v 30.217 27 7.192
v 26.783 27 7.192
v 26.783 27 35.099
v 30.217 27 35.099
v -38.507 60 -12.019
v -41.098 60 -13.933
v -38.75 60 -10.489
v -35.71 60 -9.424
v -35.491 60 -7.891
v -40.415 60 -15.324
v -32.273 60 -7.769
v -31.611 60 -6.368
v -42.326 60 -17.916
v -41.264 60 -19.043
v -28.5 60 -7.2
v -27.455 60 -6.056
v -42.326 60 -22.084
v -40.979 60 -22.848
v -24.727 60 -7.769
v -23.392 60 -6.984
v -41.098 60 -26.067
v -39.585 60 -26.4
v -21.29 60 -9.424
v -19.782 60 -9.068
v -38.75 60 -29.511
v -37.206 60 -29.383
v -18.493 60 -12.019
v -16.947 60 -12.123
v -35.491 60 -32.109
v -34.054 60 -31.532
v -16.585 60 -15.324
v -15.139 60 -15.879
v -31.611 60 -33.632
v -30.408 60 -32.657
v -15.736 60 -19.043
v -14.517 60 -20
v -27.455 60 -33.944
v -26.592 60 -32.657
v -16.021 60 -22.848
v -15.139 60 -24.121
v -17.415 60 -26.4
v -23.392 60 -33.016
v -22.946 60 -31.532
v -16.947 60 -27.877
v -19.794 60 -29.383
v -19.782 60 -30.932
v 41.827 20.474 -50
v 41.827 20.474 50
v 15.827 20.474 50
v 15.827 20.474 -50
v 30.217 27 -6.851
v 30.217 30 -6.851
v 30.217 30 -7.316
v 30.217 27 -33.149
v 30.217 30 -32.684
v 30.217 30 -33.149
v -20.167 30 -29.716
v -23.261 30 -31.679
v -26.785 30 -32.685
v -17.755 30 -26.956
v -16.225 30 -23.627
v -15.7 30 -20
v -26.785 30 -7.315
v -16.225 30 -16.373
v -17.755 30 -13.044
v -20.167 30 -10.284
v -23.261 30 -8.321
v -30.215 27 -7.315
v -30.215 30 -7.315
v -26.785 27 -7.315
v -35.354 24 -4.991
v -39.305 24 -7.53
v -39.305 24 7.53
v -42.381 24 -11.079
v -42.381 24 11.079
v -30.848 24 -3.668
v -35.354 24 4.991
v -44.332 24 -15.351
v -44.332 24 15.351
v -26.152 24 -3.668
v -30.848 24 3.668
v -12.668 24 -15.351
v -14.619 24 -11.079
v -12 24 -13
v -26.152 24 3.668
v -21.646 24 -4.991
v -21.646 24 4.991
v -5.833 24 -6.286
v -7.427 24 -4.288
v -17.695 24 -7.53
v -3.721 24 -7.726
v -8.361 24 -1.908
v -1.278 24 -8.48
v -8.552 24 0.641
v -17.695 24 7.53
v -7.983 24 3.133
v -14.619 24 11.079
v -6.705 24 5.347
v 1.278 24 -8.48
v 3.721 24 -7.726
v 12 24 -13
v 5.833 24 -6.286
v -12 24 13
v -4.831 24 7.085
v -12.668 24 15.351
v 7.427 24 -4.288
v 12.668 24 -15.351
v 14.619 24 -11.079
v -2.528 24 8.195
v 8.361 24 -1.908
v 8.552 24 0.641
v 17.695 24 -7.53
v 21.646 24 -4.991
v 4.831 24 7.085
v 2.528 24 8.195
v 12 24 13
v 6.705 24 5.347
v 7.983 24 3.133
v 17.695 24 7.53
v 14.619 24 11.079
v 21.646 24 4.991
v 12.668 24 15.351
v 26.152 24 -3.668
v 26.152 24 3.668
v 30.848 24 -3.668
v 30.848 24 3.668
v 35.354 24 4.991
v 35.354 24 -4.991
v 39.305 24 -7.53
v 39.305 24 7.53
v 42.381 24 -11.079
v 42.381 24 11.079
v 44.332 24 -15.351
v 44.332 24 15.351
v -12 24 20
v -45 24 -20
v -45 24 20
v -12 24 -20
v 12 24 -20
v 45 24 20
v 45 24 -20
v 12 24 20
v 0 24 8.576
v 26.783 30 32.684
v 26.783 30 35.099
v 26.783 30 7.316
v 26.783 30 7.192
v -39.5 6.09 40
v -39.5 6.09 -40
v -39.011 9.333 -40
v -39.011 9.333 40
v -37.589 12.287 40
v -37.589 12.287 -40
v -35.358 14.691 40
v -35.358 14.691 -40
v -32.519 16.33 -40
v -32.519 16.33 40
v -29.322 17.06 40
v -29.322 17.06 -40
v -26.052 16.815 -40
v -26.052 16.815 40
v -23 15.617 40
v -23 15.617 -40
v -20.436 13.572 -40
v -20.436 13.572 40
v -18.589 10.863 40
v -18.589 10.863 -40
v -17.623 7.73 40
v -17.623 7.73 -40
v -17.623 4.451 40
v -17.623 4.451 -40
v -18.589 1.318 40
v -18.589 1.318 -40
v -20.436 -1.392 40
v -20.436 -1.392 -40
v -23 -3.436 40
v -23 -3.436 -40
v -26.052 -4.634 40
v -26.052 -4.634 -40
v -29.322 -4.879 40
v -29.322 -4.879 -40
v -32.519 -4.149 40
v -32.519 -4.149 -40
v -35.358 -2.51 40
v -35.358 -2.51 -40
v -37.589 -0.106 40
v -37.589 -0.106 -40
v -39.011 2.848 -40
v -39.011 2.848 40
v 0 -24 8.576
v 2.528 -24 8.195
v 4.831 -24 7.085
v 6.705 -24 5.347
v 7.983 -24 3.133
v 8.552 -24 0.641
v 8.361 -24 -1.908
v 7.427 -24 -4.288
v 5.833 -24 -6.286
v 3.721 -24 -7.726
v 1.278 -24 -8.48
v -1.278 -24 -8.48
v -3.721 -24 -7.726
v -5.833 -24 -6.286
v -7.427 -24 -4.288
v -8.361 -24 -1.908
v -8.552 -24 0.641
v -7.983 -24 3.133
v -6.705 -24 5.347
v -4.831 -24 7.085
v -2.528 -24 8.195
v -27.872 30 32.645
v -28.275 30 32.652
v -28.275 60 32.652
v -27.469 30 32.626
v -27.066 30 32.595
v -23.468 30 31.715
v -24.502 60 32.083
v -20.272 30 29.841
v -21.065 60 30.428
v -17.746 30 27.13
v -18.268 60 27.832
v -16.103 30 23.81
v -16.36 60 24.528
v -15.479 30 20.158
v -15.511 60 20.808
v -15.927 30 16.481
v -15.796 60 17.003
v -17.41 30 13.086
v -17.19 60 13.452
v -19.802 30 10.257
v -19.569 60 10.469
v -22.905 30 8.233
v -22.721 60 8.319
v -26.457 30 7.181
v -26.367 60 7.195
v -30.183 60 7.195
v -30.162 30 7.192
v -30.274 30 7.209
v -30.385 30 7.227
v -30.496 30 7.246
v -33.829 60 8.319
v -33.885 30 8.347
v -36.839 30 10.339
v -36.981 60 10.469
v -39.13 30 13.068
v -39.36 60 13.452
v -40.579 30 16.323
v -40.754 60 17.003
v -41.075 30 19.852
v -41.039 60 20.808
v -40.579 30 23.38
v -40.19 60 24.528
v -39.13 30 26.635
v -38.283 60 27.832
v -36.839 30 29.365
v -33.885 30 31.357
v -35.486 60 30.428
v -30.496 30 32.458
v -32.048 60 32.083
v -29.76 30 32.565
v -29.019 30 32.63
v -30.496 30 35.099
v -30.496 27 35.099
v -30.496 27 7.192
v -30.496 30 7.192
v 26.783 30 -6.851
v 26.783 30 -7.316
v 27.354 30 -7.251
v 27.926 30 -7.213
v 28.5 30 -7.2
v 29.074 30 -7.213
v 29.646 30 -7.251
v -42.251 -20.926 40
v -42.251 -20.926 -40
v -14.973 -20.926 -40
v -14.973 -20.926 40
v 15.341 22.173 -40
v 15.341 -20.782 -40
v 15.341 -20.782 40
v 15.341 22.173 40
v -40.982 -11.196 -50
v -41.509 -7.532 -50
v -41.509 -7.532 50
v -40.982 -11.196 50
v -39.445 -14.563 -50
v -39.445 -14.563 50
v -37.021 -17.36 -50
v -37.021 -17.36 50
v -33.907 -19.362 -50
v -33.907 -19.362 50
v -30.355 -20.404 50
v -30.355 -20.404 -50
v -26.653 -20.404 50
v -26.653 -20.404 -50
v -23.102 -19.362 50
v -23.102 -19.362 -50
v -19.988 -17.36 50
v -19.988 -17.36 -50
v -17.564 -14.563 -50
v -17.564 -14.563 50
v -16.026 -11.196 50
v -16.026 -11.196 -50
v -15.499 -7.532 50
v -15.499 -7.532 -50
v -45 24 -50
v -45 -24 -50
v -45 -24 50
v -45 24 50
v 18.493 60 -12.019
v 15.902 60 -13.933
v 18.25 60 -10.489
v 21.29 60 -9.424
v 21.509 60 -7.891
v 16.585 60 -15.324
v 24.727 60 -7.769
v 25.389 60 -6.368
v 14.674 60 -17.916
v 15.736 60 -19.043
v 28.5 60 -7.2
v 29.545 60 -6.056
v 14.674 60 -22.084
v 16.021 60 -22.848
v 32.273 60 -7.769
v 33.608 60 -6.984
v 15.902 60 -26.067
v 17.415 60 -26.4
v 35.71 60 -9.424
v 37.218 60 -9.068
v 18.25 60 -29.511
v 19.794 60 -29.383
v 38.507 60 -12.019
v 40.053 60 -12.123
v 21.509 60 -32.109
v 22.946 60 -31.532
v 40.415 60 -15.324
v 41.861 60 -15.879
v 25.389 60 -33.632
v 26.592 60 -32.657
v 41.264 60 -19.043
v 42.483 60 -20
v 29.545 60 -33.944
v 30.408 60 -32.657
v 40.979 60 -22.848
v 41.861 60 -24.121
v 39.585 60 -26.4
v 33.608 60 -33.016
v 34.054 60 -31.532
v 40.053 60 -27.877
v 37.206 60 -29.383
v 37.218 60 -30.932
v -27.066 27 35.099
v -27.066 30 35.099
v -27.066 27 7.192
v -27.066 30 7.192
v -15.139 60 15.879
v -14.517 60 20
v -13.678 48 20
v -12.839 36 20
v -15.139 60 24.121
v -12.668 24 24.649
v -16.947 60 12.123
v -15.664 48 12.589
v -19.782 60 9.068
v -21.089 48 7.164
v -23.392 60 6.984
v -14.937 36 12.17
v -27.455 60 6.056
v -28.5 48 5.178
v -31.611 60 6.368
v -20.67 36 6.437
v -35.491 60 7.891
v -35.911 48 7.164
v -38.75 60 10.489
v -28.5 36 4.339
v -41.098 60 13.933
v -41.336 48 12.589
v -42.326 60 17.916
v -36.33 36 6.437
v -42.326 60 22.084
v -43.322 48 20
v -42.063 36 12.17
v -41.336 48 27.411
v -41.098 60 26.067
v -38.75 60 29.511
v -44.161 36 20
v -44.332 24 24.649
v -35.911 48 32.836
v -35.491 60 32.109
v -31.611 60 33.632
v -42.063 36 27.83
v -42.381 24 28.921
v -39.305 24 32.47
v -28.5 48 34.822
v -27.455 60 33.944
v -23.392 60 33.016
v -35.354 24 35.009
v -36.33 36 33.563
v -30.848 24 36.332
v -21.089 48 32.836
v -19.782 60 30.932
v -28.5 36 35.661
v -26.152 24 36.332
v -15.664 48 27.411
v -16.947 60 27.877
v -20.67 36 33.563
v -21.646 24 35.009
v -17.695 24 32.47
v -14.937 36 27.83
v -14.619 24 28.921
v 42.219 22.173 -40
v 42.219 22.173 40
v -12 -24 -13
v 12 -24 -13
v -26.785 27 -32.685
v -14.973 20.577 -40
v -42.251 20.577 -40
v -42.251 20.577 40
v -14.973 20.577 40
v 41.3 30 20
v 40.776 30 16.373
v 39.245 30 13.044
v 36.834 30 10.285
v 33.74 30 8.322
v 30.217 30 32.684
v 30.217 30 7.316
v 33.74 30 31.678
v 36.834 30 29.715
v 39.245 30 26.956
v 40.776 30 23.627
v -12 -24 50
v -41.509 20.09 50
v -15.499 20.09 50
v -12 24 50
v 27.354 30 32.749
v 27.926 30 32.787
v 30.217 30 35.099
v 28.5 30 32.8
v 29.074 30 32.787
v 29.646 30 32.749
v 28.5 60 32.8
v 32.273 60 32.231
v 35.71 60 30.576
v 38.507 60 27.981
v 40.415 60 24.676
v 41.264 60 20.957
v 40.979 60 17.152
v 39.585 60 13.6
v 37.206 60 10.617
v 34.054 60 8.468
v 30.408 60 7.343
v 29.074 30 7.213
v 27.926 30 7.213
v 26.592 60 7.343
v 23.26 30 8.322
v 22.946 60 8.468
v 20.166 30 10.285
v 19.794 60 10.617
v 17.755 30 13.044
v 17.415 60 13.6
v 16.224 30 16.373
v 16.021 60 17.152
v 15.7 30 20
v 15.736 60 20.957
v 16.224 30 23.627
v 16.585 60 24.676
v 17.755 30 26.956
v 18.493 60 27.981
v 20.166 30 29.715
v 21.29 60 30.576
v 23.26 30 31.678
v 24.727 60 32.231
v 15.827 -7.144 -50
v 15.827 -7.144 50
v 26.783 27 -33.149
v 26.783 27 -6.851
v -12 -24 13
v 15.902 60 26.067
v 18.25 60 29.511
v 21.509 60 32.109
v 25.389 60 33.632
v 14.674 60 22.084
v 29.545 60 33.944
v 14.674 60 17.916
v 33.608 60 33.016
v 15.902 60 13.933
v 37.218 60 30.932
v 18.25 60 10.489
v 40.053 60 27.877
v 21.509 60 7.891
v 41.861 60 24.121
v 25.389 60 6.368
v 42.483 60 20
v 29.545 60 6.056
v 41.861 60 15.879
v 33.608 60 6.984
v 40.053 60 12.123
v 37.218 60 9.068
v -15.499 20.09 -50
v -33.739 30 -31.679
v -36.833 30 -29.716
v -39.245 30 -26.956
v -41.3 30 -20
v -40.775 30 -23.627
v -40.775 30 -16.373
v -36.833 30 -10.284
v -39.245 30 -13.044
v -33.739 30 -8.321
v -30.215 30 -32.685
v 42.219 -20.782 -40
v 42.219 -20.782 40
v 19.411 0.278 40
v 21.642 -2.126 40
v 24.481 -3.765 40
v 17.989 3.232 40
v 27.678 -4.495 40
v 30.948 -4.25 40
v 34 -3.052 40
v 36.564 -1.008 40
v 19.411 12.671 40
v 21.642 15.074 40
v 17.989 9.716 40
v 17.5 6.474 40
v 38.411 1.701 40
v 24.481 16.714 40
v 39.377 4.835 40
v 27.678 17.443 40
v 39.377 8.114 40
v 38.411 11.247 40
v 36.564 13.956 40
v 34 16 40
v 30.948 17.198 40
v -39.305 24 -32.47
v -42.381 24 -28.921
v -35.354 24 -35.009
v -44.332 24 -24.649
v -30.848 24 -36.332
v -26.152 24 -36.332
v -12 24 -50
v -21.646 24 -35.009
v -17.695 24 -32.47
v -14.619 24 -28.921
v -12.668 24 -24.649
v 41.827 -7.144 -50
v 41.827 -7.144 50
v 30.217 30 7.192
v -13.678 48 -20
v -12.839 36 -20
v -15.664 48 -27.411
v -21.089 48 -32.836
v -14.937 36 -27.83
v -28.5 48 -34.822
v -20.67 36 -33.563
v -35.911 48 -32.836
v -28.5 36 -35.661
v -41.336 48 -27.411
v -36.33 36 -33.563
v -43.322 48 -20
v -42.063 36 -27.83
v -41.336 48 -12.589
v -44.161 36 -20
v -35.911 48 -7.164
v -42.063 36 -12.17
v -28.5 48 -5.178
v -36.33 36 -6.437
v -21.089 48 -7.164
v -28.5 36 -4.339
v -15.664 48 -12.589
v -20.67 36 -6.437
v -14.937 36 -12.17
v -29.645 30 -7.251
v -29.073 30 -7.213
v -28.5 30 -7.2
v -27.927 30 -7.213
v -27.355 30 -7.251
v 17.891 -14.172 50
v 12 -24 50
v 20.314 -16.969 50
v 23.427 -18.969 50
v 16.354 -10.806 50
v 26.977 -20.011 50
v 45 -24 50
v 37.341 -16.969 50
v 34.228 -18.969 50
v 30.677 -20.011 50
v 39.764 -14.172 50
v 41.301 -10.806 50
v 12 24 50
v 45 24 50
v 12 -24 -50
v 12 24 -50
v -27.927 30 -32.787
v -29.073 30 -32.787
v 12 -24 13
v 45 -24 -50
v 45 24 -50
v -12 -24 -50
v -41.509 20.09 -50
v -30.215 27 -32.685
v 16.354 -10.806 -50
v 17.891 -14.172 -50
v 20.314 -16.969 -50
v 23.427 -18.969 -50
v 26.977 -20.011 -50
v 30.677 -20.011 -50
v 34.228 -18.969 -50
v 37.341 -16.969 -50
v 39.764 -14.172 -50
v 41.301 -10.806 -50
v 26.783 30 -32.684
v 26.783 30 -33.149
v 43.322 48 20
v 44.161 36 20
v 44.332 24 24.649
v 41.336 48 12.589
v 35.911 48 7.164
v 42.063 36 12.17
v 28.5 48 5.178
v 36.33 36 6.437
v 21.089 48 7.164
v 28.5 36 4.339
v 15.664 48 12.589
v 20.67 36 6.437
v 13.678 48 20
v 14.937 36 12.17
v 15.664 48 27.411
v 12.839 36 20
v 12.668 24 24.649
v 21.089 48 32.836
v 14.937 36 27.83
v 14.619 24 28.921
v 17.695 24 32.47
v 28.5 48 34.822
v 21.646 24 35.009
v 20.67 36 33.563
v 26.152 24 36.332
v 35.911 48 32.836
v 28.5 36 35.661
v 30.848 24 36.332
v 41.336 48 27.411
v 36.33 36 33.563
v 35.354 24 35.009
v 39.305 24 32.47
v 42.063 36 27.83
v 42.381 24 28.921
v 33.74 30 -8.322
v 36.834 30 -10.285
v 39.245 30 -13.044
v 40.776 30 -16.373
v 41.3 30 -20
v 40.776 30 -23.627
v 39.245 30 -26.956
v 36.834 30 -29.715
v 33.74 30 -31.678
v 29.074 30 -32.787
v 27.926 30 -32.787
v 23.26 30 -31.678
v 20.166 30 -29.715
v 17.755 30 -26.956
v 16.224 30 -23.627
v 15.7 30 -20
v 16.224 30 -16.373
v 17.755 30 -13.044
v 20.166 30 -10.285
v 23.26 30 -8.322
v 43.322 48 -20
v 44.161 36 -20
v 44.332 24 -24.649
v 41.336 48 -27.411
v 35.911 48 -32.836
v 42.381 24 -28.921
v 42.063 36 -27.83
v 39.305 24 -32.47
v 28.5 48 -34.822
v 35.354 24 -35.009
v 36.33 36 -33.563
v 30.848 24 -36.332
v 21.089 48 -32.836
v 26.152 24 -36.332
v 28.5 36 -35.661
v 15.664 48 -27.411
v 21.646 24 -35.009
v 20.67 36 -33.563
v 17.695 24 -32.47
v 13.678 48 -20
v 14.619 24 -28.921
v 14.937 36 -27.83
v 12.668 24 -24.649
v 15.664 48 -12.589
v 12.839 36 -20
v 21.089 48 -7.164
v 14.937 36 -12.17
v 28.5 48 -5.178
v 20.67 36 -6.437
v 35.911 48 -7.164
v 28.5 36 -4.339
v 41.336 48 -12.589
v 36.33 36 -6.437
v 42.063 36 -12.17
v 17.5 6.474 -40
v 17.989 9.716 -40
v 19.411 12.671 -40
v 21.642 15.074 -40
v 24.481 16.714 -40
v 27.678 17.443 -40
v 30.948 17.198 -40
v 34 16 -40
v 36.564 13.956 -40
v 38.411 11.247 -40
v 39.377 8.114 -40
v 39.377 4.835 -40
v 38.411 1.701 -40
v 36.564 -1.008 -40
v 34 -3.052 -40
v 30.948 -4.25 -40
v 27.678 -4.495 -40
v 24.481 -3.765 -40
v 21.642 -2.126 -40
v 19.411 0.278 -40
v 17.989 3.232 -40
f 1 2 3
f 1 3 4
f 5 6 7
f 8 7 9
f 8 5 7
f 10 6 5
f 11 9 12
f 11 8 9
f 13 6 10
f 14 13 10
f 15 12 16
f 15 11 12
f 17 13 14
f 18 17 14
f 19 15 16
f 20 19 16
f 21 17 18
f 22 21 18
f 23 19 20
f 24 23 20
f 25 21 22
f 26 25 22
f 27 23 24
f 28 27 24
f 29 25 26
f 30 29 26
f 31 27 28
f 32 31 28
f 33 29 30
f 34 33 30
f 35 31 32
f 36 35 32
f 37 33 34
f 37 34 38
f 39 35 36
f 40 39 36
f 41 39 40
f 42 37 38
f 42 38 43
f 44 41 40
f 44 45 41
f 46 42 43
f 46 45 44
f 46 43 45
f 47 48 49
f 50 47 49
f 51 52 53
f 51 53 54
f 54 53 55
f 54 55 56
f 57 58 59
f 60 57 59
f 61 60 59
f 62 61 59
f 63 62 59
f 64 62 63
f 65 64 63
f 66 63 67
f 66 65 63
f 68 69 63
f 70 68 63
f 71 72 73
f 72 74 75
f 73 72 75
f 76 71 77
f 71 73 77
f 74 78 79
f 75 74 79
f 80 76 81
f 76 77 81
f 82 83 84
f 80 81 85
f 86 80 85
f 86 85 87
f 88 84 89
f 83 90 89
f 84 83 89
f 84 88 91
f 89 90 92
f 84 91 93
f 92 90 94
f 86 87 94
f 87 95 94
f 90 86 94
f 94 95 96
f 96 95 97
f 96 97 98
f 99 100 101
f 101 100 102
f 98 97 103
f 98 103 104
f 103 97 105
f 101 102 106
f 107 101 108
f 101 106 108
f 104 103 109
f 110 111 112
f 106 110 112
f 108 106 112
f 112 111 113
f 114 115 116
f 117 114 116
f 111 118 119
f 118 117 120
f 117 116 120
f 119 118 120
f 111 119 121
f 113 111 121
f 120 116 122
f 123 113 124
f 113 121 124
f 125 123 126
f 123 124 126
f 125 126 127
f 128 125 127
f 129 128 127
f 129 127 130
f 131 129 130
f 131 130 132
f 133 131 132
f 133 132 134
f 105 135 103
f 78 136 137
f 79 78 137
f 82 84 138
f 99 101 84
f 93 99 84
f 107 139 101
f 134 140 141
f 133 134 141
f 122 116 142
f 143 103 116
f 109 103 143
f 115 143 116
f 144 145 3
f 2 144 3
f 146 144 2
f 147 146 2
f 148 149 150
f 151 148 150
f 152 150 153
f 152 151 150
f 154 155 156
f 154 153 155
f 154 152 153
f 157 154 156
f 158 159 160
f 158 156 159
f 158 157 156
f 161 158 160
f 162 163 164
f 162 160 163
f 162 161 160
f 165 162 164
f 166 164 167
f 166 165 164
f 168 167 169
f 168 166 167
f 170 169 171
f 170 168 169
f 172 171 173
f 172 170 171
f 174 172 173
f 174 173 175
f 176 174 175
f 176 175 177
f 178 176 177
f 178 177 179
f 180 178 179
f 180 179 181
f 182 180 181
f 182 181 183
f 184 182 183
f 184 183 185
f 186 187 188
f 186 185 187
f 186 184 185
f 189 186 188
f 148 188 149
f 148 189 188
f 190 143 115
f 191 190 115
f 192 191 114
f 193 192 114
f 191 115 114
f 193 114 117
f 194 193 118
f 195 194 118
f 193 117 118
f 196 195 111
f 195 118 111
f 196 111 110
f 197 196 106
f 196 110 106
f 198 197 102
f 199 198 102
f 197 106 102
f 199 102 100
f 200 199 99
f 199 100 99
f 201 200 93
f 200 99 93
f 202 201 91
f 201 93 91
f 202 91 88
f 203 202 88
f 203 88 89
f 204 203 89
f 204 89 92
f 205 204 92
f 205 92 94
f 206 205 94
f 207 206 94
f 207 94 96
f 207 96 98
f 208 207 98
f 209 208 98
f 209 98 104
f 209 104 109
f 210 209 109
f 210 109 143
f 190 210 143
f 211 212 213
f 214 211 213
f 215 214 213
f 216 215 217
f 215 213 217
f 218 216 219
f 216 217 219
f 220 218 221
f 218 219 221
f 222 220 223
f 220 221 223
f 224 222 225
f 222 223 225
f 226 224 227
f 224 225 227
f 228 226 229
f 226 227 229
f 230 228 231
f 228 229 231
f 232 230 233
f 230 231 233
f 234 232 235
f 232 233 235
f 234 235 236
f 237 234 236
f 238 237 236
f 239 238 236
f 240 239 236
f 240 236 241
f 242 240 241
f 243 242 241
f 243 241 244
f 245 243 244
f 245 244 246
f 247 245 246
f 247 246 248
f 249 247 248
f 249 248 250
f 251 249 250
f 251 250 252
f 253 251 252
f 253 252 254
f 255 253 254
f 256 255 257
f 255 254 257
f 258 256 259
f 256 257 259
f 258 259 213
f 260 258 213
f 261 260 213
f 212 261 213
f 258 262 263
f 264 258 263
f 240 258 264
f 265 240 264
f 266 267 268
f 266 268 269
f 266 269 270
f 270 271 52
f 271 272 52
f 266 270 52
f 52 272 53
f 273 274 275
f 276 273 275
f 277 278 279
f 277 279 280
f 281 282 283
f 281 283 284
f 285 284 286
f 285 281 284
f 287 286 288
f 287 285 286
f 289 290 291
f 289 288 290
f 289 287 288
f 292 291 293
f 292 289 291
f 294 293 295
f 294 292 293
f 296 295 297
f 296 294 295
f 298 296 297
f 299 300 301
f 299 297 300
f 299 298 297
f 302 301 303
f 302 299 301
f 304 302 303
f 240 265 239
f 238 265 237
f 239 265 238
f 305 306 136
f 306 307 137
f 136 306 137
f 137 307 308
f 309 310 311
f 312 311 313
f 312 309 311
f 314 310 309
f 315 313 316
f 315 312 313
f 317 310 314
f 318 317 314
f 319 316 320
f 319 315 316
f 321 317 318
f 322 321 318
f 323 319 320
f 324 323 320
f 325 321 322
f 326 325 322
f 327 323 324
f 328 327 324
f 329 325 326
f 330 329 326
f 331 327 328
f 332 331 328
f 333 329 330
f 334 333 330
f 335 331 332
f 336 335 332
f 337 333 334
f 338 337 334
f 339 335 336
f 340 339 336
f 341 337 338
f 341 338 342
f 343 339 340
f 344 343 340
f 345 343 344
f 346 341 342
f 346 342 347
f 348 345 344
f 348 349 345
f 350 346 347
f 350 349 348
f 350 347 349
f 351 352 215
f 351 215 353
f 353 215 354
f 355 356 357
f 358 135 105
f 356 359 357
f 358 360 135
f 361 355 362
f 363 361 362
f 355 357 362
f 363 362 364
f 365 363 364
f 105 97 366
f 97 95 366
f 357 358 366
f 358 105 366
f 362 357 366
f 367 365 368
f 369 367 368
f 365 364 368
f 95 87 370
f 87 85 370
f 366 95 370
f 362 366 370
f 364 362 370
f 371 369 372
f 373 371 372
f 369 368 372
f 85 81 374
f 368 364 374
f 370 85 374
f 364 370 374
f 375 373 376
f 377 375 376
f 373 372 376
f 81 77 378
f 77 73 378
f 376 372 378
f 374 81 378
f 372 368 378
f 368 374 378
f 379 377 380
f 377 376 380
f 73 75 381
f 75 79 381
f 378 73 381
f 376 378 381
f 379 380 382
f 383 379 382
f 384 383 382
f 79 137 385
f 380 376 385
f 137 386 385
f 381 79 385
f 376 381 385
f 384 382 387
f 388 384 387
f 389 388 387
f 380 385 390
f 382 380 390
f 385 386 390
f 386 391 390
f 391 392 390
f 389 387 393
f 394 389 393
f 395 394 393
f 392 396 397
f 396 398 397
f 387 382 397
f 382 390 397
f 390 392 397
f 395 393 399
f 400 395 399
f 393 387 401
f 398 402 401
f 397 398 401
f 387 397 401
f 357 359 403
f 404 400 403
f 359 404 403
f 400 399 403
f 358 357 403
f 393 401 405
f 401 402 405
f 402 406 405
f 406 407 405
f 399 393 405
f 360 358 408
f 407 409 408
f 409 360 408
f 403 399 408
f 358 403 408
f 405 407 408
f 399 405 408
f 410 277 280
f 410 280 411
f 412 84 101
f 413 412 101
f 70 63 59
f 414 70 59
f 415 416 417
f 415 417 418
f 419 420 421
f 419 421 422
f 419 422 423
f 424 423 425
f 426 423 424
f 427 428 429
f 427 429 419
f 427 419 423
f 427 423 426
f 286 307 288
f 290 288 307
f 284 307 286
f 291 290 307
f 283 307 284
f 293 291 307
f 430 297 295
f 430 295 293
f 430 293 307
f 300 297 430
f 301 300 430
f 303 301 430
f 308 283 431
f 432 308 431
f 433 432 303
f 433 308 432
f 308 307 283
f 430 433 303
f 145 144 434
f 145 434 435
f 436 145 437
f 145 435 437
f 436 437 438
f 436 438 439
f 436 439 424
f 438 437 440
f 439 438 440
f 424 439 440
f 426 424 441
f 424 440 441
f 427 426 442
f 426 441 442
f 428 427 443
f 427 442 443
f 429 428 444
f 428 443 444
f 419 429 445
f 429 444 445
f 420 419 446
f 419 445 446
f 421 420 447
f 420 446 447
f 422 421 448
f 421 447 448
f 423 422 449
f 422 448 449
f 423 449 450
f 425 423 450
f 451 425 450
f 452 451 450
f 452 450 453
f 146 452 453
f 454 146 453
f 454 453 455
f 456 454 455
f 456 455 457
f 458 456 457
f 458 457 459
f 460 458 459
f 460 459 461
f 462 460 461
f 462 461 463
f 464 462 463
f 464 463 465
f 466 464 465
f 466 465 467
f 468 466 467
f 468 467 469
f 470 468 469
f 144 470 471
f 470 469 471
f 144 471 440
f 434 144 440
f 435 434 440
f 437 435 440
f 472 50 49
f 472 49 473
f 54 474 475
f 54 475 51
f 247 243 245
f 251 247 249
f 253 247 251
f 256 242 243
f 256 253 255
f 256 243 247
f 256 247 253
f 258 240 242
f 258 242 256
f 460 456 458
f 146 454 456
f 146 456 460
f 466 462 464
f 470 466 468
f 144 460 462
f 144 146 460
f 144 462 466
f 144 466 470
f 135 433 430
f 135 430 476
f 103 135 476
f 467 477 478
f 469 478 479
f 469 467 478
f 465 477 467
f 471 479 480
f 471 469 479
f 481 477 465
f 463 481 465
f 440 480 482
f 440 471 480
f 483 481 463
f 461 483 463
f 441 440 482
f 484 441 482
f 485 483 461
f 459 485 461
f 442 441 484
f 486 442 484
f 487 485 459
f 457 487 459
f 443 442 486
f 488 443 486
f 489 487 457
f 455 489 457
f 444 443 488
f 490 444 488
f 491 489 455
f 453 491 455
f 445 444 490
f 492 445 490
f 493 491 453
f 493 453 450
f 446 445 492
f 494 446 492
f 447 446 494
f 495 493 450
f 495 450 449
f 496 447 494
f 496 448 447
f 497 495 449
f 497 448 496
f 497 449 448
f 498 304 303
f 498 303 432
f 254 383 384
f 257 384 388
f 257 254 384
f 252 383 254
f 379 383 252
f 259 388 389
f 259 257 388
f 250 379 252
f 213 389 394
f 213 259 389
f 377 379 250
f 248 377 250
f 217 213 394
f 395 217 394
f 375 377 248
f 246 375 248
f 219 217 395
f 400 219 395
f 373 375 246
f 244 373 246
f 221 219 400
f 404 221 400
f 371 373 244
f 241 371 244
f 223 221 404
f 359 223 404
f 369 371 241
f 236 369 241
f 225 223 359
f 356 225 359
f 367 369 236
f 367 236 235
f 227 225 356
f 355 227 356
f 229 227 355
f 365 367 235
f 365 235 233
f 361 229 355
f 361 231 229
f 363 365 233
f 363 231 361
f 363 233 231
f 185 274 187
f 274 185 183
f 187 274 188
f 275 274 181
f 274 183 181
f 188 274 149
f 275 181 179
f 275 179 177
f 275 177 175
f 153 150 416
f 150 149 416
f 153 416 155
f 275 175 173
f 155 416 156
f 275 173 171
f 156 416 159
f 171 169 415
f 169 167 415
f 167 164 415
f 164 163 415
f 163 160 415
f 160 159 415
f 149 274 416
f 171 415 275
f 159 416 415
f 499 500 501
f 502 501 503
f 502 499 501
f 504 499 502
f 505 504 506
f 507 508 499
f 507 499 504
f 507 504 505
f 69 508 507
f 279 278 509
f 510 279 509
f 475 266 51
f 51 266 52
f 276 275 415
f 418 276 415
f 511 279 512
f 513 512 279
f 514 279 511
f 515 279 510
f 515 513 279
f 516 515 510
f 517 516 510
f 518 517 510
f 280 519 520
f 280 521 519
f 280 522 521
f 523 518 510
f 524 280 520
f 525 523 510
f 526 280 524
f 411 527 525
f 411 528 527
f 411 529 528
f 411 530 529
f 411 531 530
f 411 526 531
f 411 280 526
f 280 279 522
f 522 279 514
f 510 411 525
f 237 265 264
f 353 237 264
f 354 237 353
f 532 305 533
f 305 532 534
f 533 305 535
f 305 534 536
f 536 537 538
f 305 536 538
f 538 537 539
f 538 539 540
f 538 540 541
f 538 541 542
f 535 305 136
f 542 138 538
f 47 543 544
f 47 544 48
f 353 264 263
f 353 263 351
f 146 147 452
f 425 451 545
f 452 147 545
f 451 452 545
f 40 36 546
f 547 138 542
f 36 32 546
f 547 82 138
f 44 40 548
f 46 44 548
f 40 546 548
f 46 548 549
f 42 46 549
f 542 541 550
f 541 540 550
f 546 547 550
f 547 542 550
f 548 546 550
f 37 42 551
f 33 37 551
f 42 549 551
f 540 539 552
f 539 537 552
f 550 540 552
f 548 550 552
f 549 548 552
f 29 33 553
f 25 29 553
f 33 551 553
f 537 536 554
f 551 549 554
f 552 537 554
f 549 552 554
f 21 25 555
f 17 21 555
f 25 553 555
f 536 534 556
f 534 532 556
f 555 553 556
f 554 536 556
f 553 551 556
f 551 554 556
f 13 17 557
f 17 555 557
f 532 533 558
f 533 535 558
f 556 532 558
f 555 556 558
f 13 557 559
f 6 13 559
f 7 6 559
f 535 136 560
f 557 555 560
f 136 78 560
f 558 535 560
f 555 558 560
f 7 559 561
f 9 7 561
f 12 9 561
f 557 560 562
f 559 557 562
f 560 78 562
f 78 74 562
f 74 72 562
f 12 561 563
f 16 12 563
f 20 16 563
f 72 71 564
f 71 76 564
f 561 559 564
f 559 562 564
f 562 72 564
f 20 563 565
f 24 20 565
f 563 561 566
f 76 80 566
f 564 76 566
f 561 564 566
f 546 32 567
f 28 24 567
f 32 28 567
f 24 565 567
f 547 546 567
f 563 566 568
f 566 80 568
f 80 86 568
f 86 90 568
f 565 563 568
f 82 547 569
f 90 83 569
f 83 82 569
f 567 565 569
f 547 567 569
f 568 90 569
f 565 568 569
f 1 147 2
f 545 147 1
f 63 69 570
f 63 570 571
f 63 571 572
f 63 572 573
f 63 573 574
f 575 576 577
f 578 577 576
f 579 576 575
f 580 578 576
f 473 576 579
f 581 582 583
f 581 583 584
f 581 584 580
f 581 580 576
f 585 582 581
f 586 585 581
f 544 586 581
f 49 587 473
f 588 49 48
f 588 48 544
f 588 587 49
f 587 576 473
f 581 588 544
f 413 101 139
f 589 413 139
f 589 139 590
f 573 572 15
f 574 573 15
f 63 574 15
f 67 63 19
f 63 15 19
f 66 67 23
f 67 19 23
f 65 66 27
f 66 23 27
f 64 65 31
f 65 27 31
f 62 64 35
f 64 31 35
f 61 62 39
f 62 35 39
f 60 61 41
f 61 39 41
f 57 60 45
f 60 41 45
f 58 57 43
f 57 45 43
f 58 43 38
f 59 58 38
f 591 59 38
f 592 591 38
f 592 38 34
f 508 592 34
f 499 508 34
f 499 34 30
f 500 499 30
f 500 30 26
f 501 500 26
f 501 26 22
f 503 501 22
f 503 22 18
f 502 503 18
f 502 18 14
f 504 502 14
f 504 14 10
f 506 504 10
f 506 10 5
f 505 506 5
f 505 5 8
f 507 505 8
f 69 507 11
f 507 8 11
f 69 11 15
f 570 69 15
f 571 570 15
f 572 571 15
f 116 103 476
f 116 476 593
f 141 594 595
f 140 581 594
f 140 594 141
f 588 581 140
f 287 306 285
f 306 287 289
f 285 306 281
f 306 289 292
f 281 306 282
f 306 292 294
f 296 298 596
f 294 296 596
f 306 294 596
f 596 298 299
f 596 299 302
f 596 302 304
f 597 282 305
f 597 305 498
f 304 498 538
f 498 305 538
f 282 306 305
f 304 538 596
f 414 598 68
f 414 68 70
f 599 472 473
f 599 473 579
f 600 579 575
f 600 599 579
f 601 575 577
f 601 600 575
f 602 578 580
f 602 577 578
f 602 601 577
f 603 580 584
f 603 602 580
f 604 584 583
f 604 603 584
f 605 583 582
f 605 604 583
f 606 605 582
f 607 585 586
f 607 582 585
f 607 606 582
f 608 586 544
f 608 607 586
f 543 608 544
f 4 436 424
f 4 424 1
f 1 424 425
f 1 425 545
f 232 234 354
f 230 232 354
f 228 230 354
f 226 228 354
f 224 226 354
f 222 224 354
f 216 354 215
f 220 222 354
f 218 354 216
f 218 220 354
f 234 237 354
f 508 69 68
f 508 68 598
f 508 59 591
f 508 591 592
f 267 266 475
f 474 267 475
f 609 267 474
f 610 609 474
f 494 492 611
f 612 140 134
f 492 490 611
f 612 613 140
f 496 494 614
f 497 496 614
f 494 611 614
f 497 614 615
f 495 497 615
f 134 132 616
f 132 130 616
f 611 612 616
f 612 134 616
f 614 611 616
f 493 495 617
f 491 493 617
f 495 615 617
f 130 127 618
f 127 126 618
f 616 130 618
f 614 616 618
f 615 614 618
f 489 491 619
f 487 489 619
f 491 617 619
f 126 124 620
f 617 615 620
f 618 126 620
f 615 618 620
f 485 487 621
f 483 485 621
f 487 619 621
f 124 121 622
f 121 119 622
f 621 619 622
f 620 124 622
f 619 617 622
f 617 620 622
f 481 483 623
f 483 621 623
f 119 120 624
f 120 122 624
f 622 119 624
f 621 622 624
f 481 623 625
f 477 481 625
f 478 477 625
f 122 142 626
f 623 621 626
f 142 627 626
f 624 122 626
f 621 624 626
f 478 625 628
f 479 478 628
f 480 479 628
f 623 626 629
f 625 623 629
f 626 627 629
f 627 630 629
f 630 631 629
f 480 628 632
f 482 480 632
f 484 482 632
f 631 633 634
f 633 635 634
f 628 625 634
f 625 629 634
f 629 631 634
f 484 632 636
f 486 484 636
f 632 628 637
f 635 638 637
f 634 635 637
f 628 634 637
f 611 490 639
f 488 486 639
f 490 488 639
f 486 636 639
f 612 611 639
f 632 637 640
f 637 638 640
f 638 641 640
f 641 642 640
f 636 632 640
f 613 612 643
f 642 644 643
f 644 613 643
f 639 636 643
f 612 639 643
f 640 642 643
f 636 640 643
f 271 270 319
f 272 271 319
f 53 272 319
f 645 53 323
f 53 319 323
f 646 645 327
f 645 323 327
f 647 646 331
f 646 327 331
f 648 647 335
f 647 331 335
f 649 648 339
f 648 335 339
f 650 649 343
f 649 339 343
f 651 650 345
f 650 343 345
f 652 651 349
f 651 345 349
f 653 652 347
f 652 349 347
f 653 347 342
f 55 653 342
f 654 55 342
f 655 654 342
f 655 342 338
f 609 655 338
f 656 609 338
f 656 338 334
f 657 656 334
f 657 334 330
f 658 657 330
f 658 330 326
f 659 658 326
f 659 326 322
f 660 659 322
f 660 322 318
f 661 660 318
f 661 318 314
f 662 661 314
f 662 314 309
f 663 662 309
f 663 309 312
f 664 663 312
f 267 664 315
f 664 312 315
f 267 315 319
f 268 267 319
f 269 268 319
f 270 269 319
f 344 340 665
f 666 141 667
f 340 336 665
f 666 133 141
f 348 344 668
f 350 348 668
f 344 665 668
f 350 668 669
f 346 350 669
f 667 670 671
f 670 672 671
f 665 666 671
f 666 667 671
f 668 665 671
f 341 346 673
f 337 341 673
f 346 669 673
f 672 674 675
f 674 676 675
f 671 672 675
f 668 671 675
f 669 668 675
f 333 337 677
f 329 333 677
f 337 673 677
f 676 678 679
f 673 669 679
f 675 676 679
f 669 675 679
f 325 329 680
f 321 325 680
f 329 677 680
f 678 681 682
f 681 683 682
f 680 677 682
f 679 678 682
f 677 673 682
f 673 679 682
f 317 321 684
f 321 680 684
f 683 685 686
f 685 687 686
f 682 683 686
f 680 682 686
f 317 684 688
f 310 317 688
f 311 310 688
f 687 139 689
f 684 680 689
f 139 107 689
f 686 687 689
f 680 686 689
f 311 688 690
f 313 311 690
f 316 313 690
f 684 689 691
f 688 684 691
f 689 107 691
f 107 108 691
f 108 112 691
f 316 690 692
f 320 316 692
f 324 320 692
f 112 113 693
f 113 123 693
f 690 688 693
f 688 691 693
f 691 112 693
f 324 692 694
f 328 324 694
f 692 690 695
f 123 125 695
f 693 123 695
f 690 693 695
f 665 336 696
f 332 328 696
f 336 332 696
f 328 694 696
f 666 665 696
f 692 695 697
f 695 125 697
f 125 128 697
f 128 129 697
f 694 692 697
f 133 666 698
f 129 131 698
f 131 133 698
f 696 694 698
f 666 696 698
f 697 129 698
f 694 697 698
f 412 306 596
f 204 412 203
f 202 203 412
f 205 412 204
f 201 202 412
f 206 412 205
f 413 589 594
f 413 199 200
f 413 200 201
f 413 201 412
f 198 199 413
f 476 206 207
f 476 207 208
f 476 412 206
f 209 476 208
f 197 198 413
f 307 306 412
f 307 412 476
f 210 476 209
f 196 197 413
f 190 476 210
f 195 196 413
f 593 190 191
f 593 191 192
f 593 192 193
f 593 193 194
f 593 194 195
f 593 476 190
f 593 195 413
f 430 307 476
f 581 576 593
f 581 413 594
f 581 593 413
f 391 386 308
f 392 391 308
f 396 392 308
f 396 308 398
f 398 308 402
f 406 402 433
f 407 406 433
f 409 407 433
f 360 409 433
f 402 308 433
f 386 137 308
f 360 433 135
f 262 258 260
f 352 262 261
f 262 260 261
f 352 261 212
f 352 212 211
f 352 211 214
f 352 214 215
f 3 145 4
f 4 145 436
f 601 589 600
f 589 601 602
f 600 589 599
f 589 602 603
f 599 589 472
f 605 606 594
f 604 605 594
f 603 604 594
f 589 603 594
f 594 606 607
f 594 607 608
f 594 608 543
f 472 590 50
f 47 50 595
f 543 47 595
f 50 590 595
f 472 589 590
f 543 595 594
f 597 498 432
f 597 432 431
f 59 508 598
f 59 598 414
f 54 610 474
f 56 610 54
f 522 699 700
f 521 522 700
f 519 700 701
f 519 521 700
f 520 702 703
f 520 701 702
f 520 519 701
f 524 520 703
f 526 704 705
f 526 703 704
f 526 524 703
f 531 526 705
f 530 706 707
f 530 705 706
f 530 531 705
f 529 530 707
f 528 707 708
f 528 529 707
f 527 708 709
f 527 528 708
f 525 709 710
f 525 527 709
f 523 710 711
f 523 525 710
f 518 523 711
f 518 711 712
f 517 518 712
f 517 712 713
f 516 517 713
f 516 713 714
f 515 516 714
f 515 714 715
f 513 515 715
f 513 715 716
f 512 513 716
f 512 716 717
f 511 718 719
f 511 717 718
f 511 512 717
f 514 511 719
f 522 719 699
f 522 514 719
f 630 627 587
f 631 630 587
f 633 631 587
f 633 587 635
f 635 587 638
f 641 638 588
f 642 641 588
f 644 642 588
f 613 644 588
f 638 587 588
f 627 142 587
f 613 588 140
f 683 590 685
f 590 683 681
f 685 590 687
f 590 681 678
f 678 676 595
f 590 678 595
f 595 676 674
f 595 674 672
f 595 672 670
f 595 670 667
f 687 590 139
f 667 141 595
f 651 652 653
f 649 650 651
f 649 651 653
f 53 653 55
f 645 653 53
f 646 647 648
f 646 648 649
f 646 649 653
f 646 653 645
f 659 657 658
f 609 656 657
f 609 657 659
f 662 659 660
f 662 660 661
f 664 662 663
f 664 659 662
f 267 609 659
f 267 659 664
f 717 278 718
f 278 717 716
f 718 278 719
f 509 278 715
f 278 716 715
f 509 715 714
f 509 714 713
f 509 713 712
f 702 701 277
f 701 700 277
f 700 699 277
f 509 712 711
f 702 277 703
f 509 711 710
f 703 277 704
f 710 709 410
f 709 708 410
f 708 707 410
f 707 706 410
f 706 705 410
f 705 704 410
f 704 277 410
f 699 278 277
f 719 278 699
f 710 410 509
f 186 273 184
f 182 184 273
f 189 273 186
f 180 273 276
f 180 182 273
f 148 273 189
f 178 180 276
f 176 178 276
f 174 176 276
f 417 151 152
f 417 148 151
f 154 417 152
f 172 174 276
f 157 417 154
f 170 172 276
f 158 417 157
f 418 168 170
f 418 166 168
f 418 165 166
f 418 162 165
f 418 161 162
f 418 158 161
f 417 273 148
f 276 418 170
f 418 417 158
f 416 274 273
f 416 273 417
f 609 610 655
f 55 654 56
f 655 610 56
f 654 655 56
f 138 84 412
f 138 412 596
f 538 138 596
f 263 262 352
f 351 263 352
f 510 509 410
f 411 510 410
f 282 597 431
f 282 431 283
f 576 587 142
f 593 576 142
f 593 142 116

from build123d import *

# Parameters (mm, degrees)
SKETCH1_W                     = 90
SKETCH1_H                     = 48
BOSS_EXTRUDE1_DEPTH           = 50
SKETCH2_W                     = 24
SKETCH2_H                     = 37
CUT_EXTRUDE1_DEPTH            = 100
SKETCH3_W                     = 24
SKETCH3_H                     = 37
CUT_EXTRUDE2_DEPTH            = 100
SKETCH4_R                     = 8.575546541
CUT_EXTRUDE3_DEPTH            = 100
SKETCH5_R                     = 16.5
BOSS_EXTRUDE2_DEPTH           = 36
BOSS_EXTRUDE2_DRAFT           = 4
BOSS_EXTRUDE2_PROFILE_2_DEPTH = 36
BOSS_EXTRUDE2_PROFILE_2_DRAFT = 4
BOSS_EXTRUDE2_PROFILE_3_DEPTH = 36
BOSS_EXTRUDE2_PROFILE_3_DRAFT = 4
BOSS_EXTRUDE2_PROFILE_4_DEPTH = 36
BOSS_EXTRUDE2_PROFILE_4_DRAFT = 4
SKETCH6_R                     = 12.8
CUT_EXTRUDE4_DEPTH            = 30
SKETCH10_R                    = 12.8
CUT_EXTRUDE5_DEPTH            = 30
SKETCH12_W                    = 3.43330904
SKETCH12_H                    = 26.297422042
SKETCH12_W_2                  = 3.43
SKETCH12_H_2                  = 25.369176178
SKETCH12_H_3                  = 27.907235724
CUT_EXTRUDE6_DEPTH            = 3
CUT_EXTRUDE9_DEPTH            = 91.138781887
CUT_EXTRUDE9_DEPTH_BACK       = 91.138781887
BOSS_EXTRUDE3_DEPTH           = 40
BOSS_EXTRUDE3_DEPTH_BACK      = 40
SKETCH18_W                    = 26.877606789
SKETCH18_H                    = 42.955079342
BOSS_EXTRUDE3_2_DEPTH         = 40
BOSS_EXTRUDE3_2_DEPTH_BACK    = 40
SKETCH18_W_2                  = 27.278383828
SKETCH18_H_2                  = 41.502870551
CUT_EXTRUDE10_DEPTH           = 118.153745139
CUT_EXTRUDE10_DEPTH_BACK      = 118.153745139
SKETCH19_R                    = 11


with BuildPart() as part:
    # Sketch1 → Boss-Extrude1 (new, symmetric)
    with BuildSketch(Plane.XY):
        Rectangle(SKETCH1_W, SKETCH1_H)
    extrude(amount=BOSS_EXTRUDE1_DEPTH, both=True)

    # Sketch2 → Cut-Extrude1 (cut)
    with BuildSketch(Plane(origin=(0, 24, 0), x_dir=(1, 0, 0), z_dir=(0, 1, 0))):
        with Locations((0, 31.5)):
            Rectangle(SKETCH2_W, SKETCH2_H)
    extrude(amount=-CUT_EXTRUDE1_DEPTH, mode=Mode.SUBTRACT)

    # Sketch3 → Cut-Extrude2 (cut)
    with BuildSketch(Plane(origin=(0, 24, 0), x_dir=(1, 0, 0), z_dir=(0, 1, 0))):
        with Locations((0, -31.5)):
            Rectangle(SKETCH3_W, SKETCH3_H)
    extrude(amount=-CUT_EXTRUDE2_DEPTH, mode=Mode.SUBTRACT)

    # Sketch4 → Cut-Extrude3 (cut)
    with BuildSketch(Plane(origin=(0, 24, 0), x_dir=(1, 0, 0), z_dir=(0, 1, 0))):
        with Locations(Location((0, 0, 0), (0, 0, 270))):
            Circle(SKETCH4_R)
    extrude(amount=-CUT_EXTRUDE3_DEPTH, mode=Mode.SUBTRACT)


with BuildPart() as boss_extrude2_tool:
    # Sketch5 → Boss-Extrude2 (with draft: the straight prism first)
    with BuildSketch(Plane(origin=(0, 24, 0), x_dir=(1, 0, 0), z_dir=(0, 1, 0))):
        with Locations((28.5, 20)):
            Circle(SKETCH5_R)
    extrude(amount=BOSS_EXTRUDE2_DEPTH)
    # Boss-Extrude2: the draft: its side faces are tilted about the plane it starts from
    boss_extrude2_sides = [boss_extrude2_tool.faces().sort_by_distance(p)[0] for p in [
        (12, 42, -20),
    ]]
    draft(boss_extrude2_sides, Plane(origin=(0, 24, 0), x_dir=(1, 0, 0), z_dir=(0, 1, 0)), BOSS_EXTRUDE2_DRAFT)


with BuildPart() as part_1:
    add(part.part)

    # Boss-Extrude2: add boss_extrude2_tool
    add(boss_extrude2_tool.part)


with BuildPart() as boss_extrude2_profile_2_tool:
    # Sketch5 → Boss-Extrude2 profile 2 (with draft: the straight prism first)
    with BuildSketch(Plane(origin=(0, 24, 0), x_dir=(1, 0, 0), z_dir=(0, 1, 0))):
        with Locations((-28.5, 20)):
            Circle(SKETCH5_R)
    extrude(amount=BOSS_EXTRUDE2_PROFILE_2_DEPTH)
    # Boss-Extrude2 profile 2: the draft: its side faces are tilted about the plane it starts from
    boss_extrude2_profile_2_sides = [boss_extrude2_profile_2_tool.faces().sort_by_distance(p)[0] for p in [
        (-45, 42, -20),
    ]]
    draft(boss_extrude2_profile_2_sides, Plane(origin=(0, 24, 0), x_dir=(1, 0, 0), z_dir=(0, 1, 0)), BOSS_EXTRUDE2_PROFILE_2_DRAFT)


with BuildPart() as part_2:
    add(part_1.part)

    # Boss-Extrude2 profile 2: add boss_extrude2_profile_2_tool
    add(boss_extrude2_profile_2_tool.part)


with BuildPart() as boss_extrude2_profile_3_tool:
    # Sketch5 → Boss-Extrude2 profile 3 (with draft: the straight prism first)
    with BuildSketch(Plane(origin=(0, 24, 0), x_dir=(1, 0, 0), z_dir=(0, 1, 0))):
        with Locations((-28.5, -20)):
            Circle(SKETCH5_R)
    extrude(amount=BOSS_EXTRUDE2_PROFILE_3_DEPTH)
    # Boss-Extrude2 profile 3: the draft: its side faces are tilted about the plane it starts from
    boss_extrude2_profile_3_sides = [boss_extrude2_profile_3_tool.faces().sort_by_distance(p)[0] for p in [
        (-45, 42, 20),
    ]]
    draft(boss_extrude2_profile_3_sides, Plane(origin=(0, 24, 0), x_dir=(1, 0, 0), z_dir=(0, 1, 0)), BOSS_EXTRUDE2_PROFILE_3_DRAFT)


with BuildPart() as part_3:
    add(part_2.part)

    # Boss-Extrude2 profile 3: add boss_extrude2_profile_3_tool
    add(boss_extrude2_profile_3_tool.part)


with BuildPart() as boss_extrude2_profile_4_tool:
    # Sketch5 → Boss-Extrude2 profile 4 (with draft: the straight prism first)
    with BuildSketch(Plane(origin=(0, 24, 0), x_dir=(1, 0, 0), z_dir=(0, 1, 0))):
        with Locations((28.5, -20)):
            Circle(SKETCH5_R)
    extrude(amount=BOSS_EXTRUDE2_PROFILE_4_DEPTH)
    # Boss-Extrude2 profile 4: the draft: its side faces are tilted about the plane it starts from
    boss_extrude2_profile_4_sides = [boss_extrude2_profile_4_tool.faces().sort_by_distance(p)[0] for p in [
        (12, 42, 20),
    ]]
    draft(boss_extrude2_profile_4_sides, Plane(origin=(0, 24, 0), x_dir=(1, 0, 0), z_dir=(0, 1, 0)), BOSS_EXTRUDE2_PROFILE_4_DRAFT)


with BuildPart() as part_4:
    add(part_3.part)

    # Boss-Extrude2 profile 4: add boss_extrude2_profile_4_tool
    add(boss_extrude2_profile_4_tool.part)

    # Sketch6 → Cut-Extrude4 (cut)
    with BuildSketch(Plane(origin=(0, 60, 0), x_dir=(1, 0, 0), z_dir=(0, 1, 0))):
        with Locations(Location((-28.5, 20, 0), (0, 0, 270))):
            Circle(SKETCH6_R)
    extrude(amount=-CUT_EXTRUDE4_DEPTH, mode=Mode.SUBTRACT)

    # Sketch10 → Cut-Extrude5 (cut)
    with BuildSketch(Plane(origin=(0, 60, 0), x_dir=(1, 0, 0), z_dir=(0, 1, 0))):
        with Locations(Location((-28.275205781, -19.851723188, 0), (0, 0, 270))):
            Circle(SKETCH10_R)
        with Locations(Location((28.5, -20, 0), (0, 0, 270))):
            Circle(SKETCH10_R)
        with Locations(Location((28.5, 20, 0), (0, 0, 270))):
            Circle(SKETCH10_R)
    extrude(amount=-CUT_EXTRUDE5_DEPTH, mode=Mode.SUBTRACT)

    # Sketch12 → Cut-Extrude6 (cut)
    with BuildSketch(Plane(origin=(0, 30, 0), x_dir=(1, 0, 0), z_dir=(0, 1, 0))):
        with Locations((28.5, 20)):
            Rectangle(SKETCH12_W, SKETCH12_H)
        with Locations((-28.5, 20)):
            Rectangle(SKETCH12_W_2, SKETCH12_H_2)
        with Locations((-28.781238017, -21.145164169)):
            Rectangle(SKETCH12_W_2, SKETCH12_H_3)
        with Locations((28.5, -21.145164169)):
            Rectangle(SKETCH12_W, SKETCH12_H_3)
    extrude(amount=-CUT_EXTRUDE6_DEPTH, mode=Mode.SUBTRACT)

    # Sketch13 → Cut-Extrude9 (cut, two sides: drawn at the far end of the back side and taken through both)
    with BuildSketch(Plane.XY.offset(-CUT_EXTRUDE9_DEPTH_BACK)):
        with BuildLine():
            Line((-41.509252601, 20.090355514), (-41.509252601, -7.531799792))
            ThreePointArc((-41.509252601, -7.531799792), (-28.504209783, -20.53684261), (-15.499166965, -7.531799792))
            Line((-15.499166965, -7.531799792), (-15.499166965, 20.090355514))
            Line((-15.499166965, 20.090355514), (-41.509252601, 20.090355514))
        make_face()
        with BuildLine():
            Line((15.82738357, 20.474162183), (15.82738357, -7.14376597))
            ThreePointArc((15.82738357, -7.14376597), (28.82738357, -20.14376597), (41.82738357, -7.14376597))
            Line((41.82738357, -7.14376597), (41.82738357, 20.474162183))
            Line((41.82738357, 20.474162183), (15.82738357, 20.474162183))
        make_face()
    extrude(amount=CUT_EXTRUDE9_DEPTH + CUT_EXTRUDE9_DEPTH_BACK, mode=Mode.SUBTRACT)


with BuildPart() as body_2:
    # Sketch18 → Boss-Extrude3 (new, two sides: drawn at the far end of the back side and taken through both)
    with BuildSketch(Plane.XY.offset(-BOSS_EXTRUDE3_DEPTH_BACK)):
        with Locations((28.77990316, 0.695239465)):
            Rectangle(SKETCH18_W, SKETCH18_H)
    extrude(amount=BOSS_EXTRUDE3_DEPTH + BOSS_EXTRUDE3_DEPTH_BACK)


with BuildPart() as body_3:
    # Sketch18 → Boss-Extrude3 2 (new, two sides: drawn at the far end of the back side and taken through both)
    with BuildSketch(Plane.XY.offset(-BOSS_EXTRUDE3_2_DEPTH_BACK)):
        with Locations((-28.612105285, -0.174130514)):
            Rectangle(SKETCH18_W_2, SKETCH18_H_2)
    extrude(amount=BOSS_EXTRUDE3_2_DEPTH + BOSS_EXTRUDE3_2_DEPTH_BACK)


with BuildPart() as cut_extrude10_tool:
    # Sketch19 → Cut-Extrude10 (new, two sides: drawn at the far end of the back side and taken through both)
    with BuildSketch(Plane(origin=(0, 0, -40), x_dir=(-1, 0, 0), z_dir=(0, 0, -1)).offset(-CUT_EXTRUDE10_DEPTH_BACK)):
        with Locations((-28.5, 6.474162183)):
            Circle(SKETCH19_R)
        with Locations((28.5, 6.090355514)):
            Circle(SKETCH19_R)
    extrude(amount=CUT_EXTRUDE10_DEPTH + CUT_EXTRUDE10_DEPTH_BACK)


with BuildPart() as body_2_1:
    add(body_2.part)

    # Cut-Extrude10: cut by cut_extrude10_tool
    add(cut_extrude10_tool.part, mode=Mode.SUBTRACT)


with BuildPart() as body_3_1:
    add(body_3.part)

    # Cut-Extrude10: cut by cut_extrude10_tool
    add(cut_extrude10_tool.part, mode=Mode.SUBTRACT)


solid = Compound([part_4.part, body_2_1.part, body_3_1.part])
